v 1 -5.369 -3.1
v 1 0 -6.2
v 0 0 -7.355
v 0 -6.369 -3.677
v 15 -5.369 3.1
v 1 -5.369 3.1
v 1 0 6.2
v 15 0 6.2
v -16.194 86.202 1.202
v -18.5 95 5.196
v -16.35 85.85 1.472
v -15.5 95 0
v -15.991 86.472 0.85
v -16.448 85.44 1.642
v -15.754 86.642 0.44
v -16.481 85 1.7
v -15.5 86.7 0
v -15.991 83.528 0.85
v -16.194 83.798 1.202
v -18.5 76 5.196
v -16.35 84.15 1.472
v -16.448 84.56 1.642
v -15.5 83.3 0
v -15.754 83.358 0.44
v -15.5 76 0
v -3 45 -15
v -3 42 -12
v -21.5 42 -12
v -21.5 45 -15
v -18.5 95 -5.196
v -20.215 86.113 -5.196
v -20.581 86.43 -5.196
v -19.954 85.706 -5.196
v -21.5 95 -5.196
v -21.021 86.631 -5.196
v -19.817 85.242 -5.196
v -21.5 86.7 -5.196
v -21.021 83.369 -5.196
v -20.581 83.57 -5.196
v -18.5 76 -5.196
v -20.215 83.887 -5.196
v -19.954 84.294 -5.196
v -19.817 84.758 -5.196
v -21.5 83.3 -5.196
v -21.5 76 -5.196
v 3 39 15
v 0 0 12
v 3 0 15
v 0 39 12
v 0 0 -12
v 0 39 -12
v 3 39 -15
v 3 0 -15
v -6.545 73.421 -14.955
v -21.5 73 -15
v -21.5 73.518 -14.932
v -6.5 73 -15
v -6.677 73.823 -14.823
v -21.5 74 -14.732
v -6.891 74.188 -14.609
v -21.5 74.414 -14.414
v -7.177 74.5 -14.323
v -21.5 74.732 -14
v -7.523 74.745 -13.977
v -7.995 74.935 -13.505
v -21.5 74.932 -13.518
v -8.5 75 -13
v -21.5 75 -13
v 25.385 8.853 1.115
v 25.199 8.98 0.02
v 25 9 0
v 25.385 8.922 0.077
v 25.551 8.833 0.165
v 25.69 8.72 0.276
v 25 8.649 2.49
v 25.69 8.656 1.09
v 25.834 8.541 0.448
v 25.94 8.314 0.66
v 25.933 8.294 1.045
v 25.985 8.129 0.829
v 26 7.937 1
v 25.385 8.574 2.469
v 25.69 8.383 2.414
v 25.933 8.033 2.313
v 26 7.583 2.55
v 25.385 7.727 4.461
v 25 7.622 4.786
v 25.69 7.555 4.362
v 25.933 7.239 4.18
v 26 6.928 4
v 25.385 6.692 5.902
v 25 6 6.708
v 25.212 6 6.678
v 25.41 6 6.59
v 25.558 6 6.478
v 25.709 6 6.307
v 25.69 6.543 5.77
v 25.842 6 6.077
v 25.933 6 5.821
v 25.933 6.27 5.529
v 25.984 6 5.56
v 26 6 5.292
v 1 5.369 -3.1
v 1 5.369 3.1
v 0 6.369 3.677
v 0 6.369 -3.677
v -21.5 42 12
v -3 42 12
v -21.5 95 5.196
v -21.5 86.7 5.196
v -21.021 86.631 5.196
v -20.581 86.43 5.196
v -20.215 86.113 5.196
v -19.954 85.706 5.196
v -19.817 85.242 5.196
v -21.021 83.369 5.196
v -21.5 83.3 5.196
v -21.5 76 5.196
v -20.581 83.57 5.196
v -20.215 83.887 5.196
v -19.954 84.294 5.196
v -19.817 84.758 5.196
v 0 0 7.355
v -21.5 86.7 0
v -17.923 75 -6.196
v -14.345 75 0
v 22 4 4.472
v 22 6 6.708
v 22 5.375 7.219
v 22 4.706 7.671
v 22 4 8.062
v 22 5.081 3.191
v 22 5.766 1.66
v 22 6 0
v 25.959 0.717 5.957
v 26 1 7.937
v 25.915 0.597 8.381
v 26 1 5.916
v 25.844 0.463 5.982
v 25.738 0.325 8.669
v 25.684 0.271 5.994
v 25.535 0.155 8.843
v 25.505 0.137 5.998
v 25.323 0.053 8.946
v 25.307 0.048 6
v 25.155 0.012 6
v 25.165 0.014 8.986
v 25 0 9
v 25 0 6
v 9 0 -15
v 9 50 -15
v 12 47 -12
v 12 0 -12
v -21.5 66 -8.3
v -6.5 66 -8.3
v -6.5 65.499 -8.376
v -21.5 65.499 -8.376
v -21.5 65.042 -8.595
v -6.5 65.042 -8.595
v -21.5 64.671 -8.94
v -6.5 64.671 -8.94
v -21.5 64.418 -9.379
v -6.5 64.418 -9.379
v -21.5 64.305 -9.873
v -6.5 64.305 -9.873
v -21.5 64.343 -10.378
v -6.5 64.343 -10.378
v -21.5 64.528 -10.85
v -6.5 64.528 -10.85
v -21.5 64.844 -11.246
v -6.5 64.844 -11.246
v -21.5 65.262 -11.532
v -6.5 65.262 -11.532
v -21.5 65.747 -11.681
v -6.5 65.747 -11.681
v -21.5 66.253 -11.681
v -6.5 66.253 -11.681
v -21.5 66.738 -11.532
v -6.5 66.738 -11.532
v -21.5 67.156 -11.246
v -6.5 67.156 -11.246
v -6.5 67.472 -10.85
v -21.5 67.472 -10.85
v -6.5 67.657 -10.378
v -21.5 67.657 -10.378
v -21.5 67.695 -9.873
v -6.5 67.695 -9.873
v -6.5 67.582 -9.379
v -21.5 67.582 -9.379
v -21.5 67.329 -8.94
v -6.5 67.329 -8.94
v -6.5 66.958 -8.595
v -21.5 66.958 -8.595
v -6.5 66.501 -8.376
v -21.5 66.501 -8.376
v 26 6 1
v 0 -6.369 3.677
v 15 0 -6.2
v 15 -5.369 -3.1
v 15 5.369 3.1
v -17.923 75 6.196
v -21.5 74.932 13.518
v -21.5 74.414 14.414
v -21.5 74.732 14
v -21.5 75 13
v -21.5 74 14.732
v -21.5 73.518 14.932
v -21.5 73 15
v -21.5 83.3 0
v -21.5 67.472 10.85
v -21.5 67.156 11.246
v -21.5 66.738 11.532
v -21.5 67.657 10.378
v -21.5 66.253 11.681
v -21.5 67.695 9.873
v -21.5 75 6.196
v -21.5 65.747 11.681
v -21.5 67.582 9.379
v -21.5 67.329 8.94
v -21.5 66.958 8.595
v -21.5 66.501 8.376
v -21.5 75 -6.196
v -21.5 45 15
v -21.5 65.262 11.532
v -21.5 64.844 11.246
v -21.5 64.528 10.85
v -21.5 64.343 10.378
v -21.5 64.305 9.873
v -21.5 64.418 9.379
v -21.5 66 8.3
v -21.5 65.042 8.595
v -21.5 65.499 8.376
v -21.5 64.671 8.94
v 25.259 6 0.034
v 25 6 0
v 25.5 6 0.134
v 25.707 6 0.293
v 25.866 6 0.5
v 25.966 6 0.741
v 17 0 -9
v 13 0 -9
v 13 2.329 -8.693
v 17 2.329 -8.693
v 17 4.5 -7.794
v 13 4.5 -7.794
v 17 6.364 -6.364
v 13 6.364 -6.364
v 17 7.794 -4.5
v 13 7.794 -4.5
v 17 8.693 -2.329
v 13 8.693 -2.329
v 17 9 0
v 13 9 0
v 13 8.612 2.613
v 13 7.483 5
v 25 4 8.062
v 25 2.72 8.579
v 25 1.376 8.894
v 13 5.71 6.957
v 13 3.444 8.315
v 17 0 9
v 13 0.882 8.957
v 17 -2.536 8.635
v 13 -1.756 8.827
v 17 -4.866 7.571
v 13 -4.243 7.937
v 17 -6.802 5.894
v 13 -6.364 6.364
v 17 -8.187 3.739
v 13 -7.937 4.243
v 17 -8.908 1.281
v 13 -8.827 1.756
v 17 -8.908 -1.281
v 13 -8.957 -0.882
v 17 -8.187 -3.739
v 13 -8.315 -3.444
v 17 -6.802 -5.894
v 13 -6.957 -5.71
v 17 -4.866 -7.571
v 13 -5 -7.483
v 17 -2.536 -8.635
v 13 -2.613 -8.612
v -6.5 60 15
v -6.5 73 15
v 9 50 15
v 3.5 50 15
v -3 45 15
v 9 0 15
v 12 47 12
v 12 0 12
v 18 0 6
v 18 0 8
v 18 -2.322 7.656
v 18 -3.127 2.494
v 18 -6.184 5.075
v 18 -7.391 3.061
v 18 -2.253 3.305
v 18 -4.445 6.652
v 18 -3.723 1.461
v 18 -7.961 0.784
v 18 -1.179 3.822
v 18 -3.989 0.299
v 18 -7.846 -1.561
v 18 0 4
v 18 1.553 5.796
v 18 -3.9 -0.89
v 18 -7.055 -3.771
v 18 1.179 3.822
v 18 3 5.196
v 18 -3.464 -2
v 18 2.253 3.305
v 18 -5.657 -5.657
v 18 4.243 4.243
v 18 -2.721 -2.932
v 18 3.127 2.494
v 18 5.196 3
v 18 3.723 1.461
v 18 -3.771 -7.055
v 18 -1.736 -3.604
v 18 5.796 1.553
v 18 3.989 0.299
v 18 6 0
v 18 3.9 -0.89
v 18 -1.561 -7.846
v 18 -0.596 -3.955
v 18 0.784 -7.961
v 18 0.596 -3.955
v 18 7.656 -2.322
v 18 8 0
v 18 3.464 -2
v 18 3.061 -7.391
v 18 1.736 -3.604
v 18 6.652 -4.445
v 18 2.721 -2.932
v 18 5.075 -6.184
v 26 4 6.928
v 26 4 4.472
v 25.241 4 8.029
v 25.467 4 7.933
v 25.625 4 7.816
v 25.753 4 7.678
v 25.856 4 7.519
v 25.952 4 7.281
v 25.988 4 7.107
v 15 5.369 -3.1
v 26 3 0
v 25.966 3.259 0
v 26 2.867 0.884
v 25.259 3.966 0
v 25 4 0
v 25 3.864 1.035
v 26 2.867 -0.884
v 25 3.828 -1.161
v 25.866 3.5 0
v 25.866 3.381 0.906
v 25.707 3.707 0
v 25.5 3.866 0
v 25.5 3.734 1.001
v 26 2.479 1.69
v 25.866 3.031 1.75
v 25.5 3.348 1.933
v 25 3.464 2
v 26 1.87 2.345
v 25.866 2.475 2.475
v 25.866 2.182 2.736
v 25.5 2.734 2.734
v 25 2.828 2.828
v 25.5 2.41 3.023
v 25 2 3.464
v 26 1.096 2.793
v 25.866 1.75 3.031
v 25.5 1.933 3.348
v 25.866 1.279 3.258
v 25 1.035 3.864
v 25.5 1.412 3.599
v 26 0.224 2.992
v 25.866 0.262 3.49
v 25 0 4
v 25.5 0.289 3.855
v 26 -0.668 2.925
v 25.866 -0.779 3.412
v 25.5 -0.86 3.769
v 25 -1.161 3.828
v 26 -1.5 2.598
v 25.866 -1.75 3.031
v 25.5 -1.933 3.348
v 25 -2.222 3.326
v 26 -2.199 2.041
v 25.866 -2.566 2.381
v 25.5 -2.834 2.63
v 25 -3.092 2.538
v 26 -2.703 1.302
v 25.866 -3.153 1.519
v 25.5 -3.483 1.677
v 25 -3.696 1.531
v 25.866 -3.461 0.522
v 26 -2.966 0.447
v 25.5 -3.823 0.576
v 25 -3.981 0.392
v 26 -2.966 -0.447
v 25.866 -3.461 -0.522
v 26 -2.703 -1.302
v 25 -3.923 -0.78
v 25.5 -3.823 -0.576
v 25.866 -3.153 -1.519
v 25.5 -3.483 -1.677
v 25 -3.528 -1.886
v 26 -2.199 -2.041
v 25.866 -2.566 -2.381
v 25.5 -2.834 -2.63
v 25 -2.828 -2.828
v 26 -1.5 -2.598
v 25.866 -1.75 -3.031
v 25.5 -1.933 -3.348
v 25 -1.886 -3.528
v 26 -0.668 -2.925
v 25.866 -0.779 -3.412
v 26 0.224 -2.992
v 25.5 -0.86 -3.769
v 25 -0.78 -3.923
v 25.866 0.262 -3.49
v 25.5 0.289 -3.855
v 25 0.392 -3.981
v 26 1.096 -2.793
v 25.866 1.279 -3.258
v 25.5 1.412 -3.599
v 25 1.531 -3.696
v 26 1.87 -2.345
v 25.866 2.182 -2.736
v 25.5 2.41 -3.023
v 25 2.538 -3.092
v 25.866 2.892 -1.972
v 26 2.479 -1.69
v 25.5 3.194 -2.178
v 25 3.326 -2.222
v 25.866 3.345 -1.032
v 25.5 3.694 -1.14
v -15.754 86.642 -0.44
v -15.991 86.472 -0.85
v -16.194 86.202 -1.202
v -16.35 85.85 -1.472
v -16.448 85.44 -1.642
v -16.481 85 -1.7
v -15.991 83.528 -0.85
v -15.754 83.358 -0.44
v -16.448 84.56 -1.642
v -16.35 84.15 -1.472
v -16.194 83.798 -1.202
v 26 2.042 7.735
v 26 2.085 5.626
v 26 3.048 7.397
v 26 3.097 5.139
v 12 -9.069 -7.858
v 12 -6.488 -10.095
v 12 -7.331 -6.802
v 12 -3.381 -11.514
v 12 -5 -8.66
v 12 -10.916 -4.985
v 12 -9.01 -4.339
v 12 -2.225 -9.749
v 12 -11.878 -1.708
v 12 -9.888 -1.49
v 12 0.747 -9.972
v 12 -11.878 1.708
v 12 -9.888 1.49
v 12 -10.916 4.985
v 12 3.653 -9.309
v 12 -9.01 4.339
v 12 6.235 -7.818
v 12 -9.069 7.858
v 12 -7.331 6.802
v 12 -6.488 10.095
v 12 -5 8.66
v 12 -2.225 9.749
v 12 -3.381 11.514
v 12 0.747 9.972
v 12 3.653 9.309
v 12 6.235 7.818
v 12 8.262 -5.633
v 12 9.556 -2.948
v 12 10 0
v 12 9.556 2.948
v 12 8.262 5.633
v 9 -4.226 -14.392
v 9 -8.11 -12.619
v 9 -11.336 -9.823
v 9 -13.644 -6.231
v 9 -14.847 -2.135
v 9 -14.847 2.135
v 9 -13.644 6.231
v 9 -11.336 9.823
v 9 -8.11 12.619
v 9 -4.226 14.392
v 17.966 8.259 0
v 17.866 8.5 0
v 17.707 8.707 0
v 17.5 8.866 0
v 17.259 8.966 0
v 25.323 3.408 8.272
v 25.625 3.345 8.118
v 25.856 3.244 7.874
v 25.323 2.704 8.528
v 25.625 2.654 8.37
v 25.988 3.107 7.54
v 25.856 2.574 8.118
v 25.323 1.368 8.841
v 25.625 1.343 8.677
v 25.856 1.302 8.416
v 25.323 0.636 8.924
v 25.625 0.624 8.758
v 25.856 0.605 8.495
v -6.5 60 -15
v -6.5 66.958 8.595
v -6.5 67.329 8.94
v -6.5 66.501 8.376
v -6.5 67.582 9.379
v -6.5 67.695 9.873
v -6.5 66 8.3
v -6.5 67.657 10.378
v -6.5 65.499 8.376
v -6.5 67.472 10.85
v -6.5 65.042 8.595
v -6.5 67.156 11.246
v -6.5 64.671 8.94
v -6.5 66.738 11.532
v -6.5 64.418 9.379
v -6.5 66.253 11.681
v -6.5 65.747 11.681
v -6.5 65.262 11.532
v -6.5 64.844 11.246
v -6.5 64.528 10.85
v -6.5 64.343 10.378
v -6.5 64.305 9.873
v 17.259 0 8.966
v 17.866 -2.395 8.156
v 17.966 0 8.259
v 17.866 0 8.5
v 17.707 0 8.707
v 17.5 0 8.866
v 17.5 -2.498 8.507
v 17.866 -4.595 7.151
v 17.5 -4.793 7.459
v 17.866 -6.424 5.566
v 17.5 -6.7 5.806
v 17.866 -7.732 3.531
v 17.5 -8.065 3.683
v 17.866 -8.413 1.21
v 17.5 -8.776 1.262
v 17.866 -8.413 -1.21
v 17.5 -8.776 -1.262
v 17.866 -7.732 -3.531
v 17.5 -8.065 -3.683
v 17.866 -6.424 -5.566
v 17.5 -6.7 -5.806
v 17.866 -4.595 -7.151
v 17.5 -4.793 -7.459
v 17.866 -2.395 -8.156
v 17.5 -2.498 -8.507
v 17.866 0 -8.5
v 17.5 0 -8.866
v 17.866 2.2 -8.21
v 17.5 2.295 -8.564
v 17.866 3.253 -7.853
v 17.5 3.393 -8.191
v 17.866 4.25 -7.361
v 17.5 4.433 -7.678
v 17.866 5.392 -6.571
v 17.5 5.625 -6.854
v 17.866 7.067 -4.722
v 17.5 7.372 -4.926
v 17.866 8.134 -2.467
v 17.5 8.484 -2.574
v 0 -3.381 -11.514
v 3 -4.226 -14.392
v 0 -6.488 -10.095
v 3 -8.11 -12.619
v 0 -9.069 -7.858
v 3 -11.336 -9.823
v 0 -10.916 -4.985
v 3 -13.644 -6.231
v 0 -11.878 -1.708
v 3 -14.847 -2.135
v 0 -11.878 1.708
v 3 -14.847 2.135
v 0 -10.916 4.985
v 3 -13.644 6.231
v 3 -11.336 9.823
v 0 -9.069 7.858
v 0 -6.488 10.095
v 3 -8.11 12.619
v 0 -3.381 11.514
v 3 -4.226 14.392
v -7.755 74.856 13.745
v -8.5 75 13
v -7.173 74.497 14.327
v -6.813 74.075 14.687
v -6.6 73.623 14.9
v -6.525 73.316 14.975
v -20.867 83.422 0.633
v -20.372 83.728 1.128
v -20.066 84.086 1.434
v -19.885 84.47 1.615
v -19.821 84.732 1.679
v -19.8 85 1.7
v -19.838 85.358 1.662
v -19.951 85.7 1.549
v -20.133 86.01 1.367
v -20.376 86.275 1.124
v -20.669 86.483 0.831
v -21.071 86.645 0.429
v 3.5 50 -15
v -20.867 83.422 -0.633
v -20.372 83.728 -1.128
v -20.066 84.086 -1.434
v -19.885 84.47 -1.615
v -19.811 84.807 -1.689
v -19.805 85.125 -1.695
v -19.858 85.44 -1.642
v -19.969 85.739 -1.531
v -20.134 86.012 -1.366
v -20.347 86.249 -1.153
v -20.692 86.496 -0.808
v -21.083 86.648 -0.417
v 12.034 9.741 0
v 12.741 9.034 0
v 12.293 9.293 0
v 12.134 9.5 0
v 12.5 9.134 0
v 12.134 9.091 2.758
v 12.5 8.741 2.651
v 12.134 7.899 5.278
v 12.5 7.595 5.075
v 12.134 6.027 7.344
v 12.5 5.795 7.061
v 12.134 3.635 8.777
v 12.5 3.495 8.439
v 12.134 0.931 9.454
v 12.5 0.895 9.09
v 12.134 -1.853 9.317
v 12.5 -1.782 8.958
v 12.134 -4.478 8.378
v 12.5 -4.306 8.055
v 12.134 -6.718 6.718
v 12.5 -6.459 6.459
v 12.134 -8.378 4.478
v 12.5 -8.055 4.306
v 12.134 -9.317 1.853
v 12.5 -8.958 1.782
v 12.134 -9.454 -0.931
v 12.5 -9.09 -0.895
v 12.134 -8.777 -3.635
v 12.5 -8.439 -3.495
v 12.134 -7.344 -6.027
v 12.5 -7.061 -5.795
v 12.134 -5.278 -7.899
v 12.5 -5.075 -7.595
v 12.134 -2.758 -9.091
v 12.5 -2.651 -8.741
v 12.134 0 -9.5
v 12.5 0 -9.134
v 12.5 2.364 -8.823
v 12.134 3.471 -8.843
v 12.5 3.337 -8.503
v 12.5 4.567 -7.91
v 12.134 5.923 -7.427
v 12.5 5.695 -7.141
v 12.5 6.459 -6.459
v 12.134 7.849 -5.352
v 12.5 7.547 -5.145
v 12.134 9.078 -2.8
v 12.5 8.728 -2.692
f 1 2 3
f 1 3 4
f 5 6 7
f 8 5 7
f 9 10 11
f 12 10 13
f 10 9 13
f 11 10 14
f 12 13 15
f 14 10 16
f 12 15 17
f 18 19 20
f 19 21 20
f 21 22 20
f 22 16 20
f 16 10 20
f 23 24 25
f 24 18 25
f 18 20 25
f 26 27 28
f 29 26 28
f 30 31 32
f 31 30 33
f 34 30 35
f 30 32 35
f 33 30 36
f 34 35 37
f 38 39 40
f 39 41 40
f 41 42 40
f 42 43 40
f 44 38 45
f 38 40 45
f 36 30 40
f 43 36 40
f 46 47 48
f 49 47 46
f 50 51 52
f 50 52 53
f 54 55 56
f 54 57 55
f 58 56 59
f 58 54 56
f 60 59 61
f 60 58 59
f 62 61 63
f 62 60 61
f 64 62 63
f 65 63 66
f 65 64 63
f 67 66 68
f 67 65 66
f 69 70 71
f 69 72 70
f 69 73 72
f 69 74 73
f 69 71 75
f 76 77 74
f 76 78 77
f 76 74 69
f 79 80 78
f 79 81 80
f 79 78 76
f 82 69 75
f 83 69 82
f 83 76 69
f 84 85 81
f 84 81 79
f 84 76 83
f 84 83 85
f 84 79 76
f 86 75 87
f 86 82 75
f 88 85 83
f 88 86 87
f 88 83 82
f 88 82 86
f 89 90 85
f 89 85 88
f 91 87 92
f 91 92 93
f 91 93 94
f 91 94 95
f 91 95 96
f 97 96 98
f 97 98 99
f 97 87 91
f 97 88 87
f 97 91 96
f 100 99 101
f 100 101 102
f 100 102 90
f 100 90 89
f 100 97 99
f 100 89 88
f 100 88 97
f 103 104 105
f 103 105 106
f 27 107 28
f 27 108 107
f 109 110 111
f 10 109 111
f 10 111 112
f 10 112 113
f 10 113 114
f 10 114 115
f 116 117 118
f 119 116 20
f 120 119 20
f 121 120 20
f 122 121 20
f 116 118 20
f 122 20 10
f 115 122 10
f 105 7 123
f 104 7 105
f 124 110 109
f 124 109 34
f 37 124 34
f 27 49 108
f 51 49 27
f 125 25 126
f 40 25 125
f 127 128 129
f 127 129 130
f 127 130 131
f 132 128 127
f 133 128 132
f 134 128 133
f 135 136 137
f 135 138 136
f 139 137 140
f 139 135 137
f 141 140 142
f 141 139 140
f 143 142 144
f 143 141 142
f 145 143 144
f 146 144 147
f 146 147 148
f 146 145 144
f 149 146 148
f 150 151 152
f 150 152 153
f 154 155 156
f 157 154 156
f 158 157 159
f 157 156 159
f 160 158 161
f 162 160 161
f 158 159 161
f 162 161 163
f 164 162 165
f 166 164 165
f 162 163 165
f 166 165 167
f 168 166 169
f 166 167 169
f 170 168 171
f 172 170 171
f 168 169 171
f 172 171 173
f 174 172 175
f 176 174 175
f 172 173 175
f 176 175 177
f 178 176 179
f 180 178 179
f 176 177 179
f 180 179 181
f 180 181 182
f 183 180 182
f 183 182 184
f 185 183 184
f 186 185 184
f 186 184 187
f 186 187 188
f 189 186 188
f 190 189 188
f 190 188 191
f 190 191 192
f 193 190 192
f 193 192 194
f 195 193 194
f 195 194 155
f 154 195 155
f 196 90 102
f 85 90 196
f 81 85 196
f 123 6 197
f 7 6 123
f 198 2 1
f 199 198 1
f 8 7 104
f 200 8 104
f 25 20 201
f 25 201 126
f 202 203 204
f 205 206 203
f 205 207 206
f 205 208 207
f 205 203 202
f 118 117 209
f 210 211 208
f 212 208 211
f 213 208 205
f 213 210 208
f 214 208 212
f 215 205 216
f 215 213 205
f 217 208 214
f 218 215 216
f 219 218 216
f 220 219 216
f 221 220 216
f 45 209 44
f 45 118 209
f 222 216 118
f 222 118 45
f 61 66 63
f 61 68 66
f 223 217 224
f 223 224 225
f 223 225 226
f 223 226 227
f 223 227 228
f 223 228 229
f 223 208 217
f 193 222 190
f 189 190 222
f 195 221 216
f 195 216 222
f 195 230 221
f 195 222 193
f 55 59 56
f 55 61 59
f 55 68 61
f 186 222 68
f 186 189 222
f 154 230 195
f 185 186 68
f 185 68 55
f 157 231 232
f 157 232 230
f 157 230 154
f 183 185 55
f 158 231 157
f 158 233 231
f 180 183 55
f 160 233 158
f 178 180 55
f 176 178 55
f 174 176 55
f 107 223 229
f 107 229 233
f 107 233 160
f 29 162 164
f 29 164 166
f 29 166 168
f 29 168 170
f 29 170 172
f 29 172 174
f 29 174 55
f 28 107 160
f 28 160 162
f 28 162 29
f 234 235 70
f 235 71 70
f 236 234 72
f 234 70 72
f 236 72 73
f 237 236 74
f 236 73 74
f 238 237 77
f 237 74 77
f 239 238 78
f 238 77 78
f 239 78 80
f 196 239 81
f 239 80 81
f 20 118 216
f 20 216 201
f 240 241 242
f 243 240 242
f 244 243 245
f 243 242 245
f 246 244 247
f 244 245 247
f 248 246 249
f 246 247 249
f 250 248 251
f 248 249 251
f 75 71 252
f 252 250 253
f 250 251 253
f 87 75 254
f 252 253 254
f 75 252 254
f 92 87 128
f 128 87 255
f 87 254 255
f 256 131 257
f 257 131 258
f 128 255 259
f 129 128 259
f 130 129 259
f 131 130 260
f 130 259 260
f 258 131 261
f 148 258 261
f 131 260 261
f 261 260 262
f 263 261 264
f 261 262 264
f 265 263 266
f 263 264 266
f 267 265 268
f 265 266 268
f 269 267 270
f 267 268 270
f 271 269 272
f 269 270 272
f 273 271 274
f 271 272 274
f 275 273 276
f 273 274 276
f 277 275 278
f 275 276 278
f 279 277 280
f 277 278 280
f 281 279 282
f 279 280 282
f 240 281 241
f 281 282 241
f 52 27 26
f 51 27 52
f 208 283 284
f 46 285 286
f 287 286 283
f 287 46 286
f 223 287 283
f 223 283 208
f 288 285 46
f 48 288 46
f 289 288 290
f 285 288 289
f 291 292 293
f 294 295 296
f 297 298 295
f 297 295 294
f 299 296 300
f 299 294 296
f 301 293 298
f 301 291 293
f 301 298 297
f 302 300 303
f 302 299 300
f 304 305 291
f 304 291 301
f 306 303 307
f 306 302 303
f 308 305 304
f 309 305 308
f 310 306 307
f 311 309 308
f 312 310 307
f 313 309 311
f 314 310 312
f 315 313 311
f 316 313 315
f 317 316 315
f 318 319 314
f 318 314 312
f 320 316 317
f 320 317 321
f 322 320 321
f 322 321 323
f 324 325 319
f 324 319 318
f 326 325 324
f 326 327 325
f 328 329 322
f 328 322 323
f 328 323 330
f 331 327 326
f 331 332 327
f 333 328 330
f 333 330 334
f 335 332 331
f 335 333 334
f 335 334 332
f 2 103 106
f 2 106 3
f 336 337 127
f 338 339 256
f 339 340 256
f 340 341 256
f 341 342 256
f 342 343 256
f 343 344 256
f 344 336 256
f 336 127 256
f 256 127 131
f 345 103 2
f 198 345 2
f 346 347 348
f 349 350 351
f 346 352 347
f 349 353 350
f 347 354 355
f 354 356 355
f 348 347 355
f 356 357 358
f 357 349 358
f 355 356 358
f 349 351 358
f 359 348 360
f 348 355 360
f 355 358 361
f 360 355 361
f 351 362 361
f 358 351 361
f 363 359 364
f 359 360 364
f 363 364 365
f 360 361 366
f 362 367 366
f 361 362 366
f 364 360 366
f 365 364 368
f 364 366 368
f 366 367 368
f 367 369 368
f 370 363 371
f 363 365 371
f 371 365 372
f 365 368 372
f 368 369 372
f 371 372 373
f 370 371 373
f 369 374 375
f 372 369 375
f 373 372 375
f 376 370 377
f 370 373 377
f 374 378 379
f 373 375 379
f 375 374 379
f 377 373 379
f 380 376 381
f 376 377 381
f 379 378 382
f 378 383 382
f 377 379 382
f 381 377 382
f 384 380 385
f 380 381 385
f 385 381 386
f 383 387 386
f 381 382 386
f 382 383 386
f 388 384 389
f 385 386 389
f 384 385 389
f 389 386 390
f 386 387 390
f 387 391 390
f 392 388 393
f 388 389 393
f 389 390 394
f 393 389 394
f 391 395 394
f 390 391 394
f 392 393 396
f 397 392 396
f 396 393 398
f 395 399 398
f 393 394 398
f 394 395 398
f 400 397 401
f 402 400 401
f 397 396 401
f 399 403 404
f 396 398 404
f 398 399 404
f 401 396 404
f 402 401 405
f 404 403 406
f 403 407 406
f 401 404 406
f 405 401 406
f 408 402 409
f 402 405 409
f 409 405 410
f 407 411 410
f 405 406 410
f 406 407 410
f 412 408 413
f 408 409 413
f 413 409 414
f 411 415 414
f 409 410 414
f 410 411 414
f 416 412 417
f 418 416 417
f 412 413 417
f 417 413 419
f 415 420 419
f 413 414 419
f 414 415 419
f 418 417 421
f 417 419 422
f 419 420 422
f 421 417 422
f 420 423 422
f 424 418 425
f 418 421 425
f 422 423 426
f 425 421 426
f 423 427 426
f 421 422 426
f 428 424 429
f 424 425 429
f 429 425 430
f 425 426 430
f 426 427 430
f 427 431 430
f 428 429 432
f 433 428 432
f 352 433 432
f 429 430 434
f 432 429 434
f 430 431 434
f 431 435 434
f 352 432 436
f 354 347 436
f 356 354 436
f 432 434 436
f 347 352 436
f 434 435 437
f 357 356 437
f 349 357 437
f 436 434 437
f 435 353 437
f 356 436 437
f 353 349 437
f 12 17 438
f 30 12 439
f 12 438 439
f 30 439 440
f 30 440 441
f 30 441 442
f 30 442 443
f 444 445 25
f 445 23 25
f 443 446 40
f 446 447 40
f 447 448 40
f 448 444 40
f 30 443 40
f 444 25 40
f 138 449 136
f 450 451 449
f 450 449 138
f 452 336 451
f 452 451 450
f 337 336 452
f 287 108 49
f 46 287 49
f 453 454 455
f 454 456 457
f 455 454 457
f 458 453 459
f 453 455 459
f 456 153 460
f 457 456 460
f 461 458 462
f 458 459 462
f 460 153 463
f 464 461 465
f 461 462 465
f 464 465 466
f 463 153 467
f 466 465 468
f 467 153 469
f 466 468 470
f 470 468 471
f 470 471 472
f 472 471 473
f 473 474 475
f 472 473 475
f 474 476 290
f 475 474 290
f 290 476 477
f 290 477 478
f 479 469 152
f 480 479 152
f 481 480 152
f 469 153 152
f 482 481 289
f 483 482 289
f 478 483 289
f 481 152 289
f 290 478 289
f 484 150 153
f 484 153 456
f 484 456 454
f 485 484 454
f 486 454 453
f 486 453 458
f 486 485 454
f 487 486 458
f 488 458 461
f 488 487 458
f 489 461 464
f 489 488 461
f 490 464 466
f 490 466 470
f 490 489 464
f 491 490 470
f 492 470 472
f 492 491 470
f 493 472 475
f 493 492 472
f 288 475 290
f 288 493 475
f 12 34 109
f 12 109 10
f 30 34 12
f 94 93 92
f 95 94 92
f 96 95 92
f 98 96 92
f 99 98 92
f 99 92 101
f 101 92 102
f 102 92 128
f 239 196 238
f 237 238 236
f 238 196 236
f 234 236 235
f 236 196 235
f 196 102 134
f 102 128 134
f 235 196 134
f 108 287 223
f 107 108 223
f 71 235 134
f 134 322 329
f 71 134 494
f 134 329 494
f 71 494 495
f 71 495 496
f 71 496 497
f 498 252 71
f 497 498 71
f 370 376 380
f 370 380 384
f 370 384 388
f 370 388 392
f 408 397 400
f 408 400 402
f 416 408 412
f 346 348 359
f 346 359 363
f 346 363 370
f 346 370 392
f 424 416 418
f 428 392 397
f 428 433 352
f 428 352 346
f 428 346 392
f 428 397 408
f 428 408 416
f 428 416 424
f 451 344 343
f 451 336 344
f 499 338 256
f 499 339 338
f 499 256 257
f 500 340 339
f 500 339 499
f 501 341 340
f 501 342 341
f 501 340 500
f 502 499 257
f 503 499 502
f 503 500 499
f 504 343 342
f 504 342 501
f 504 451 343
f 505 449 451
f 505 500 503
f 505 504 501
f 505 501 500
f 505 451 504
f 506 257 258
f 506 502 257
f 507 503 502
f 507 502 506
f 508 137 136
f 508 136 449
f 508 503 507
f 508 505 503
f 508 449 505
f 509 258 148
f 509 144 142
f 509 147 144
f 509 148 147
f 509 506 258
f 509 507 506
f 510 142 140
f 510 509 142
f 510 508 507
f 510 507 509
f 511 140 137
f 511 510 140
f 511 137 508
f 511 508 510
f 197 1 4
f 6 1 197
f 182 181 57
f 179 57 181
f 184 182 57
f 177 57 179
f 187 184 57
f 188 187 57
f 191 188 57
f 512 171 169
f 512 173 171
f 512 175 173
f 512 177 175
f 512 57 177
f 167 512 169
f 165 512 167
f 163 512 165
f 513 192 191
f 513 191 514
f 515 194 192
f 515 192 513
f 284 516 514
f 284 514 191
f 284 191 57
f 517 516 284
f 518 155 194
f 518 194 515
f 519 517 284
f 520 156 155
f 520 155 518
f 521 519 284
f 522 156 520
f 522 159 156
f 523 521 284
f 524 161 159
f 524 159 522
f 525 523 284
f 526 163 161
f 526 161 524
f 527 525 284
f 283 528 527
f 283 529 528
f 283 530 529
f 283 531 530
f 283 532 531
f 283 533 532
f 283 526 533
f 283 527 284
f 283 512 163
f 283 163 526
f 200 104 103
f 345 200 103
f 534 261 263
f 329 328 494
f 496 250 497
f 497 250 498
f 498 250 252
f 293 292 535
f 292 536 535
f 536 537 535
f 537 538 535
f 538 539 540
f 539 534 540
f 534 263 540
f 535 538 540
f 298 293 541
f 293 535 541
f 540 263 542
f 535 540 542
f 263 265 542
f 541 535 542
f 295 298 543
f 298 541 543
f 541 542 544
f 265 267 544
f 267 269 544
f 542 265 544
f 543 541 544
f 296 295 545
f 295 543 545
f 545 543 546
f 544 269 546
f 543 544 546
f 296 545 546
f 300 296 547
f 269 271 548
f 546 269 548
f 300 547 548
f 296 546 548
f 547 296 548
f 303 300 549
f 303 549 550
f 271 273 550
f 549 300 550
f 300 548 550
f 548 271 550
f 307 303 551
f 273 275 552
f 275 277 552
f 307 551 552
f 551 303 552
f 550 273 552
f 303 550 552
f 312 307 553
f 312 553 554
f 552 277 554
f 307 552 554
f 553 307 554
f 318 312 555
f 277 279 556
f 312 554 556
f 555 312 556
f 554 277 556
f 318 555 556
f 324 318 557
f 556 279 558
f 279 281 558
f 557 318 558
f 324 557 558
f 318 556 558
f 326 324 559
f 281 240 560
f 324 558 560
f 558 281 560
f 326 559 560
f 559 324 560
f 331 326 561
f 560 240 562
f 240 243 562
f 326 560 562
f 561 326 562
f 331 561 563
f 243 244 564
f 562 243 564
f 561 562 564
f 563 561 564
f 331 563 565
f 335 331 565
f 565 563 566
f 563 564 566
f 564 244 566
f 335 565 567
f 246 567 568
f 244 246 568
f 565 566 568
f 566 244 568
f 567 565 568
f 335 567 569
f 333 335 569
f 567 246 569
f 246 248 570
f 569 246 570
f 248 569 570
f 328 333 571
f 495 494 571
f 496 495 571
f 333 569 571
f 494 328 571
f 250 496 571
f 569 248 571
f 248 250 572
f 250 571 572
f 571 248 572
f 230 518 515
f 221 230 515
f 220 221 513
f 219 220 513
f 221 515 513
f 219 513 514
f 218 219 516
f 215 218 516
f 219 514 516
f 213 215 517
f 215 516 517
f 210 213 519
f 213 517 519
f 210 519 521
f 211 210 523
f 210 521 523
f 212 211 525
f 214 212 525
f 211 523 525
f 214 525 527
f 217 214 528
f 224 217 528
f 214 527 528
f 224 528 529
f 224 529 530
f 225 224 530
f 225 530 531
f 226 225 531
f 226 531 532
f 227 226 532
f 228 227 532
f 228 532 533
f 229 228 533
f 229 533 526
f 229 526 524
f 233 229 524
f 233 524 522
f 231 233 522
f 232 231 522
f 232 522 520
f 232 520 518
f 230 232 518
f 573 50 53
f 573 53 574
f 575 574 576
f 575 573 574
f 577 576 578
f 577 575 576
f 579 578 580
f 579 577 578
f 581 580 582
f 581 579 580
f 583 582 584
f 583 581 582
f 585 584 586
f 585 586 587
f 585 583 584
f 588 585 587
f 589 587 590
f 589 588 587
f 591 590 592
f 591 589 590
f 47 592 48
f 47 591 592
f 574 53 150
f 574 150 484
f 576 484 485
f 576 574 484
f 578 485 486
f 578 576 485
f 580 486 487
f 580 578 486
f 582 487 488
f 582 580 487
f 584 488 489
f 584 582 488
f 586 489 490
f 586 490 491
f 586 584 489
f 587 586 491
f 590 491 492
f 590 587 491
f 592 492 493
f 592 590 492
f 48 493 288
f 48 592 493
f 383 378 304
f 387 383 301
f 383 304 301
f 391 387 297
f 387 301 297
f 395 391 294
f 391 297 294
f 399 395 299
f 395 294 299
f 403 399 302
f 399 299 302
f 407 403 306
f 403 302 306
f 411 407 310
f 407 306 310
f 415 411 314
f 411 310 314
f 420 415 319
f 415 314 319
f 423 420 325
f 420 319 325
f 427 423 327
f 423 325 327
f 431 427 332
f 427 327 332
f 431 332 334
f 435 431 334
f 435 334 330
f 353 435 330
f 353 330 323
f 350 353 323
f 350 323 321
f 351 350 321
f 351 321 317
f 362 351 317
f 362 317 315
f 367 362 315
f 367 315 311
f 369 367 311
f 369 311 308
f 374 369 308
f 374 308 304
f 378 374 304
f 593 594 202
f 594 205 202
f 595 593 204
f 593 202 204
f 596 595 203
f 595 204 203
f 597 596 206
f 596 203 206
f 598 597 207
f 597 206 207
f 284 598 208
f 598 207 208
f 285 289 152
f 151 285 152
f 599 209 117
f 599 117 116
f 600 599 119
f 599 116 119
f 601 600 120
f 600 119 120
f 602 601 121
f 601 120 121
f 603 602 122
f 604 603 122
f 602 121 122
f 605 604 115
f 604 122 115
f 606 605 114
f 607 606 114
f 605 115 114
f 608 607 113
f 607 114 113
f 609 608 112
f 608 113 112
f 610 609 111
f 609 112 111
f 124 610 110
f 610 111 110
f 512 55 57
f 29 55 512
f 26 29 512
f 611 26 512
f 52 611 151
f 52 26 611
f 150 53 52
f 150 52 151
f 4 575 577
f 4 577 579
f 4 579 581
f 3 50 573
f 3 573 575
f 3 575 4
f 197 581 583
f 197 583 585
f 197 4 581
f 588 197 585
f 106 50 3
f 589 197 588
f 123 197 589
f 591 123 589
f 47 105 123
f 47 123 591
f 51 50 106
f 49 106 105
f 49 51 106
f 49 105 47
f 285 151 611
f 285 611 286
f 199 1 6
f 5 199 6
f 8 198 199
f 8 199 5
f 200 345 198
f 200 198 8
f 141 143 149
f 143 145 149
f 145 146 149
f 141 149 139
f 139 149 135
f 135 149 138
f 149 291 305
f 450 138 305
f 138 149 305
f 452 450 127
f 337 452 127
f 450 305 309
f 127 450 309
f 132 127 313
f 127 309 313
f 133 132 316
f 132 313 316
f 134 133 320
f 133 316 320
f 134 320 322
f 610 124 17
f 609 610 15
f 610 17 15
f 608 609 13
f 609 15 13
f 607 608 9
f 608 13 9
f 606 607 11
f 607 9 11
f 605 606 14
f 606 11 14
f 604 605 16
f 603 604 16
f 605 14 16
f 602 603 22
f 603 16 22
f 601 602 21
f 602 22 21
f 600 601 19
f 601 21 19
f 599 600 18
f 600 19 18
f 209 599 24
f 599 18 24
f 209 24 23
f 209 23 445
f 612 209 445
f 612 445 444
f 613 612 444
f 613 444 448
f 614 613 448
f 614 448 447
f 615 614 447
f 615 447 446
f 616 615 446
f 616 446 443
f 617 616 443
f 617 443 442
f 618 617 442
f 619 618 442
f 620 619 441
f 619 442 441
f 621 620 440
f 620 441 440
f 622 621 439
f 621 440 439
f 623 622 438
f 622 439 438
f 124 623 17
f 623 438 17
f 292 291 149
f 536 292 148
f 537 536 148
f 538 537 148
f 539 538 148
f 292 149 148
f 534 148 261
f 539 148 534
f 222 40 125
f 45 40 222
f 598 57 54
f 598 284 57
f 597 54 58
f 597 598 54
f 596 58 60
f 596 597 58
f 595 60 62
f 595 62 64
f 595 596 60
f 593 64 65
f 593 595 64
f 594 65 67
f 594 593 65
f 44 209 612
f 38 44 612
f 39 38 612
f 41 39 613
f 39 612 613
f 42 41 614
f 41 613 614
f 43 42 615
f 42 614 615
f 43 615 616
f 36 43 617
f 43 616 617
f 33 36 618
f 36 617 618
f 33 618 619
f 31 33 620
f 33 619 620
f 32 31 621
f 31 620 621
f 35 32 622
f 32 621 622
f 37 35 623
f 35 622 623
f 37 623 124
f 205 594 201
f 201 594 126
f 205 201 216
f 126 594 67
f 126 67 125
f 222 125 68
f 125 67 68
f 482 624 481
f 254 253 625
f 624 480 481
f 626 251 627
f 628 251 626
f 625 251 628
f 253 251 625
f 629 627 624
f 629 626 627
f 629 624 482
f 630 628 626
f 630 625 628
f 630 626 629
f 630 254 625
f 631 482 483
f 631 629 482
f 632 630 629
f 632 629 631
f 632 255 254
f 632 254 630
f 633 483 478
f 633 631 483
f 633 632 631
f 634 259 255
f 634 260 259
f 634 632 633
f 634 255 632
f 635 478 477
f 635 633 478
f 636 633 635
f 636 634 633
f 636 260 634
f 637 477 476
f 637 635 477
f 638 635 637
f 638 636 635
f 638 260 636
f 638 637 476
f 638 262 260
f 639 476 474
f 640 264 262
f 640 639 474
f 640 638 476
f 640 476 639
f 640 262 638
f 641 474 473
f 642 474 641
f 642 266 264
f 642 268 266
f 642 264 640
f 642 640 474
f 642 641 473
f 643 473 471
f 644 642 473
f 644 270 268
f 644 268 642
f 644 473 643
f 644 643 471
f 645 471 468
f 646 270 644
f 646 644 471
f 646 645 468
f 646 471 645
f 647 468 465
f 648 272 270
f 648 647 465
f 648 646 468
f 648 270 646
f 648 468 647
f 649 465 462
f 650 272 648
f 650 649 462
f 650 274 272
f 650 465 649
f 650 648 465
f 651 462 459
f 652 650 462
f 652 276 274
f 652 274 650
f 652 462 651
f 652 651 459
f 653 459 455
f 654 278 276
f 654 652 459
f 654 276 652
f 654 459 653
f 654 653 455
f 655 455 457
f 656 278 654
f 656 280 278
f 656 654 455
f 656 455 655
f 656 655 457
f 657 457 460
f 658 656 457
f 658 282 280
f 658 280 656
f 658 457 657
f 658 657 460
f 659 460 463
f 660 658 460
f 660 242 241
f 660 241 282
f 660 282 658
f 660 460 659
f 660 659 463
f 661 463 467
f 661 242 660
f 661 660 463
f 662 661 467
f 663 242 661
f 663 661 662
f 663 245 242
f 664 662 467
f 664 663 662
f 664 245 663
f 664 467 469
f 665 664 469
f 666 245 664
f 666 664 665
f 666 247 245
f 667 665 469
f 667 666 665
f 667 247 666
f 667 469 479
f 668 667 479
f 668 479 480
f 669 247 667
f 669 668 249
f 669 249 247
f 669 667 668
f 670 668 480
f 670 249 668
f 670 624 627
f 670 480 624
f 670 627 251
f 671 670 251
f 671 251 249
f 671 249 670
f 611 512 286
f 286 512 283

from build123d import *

# Parameters (mm, degrees)
BOSS_EXTRUDE1_DEPTH  = 12
SKETCH2_R            = 9
BOSS_EXTRUDE2_DEPTH  = 6
SKETCH3_R            = 4
BOSS_EXTRUDE7_DEPTH  = 8
BOSS_EXTRUDE8_START  = -8
BOSS_EXTRUDE8_DEPTH  = 8
BOSS_EXTRUDE9_START  = -8
BOSS_EXTRUDE9_DEPTH  = 4
BOSS_EXTRUDE11_DEPTH = 21.5
BOSS_EXTRUDE12_DEPTH = 25
CHAMFER1_SIZE        = 10
SKETCH8_R            = 1.7000000000000015
CUT_EXTRUDE1_DEPTH   = 84.10385069297331
CHAMFER2_SIZE        = 3
FILLET1_R            = 2
FILLET2_R            = 1
BOSS_EXTRUDE13_DEPTH = 20
CUT_EXTRUDE2_DEPTH   = 101.54294892174786
SKETCH11_R           = 1.7000000000000037
CUT_EXTRUDE3_DEPTH   = 105.74850838221995
CHAMFER3_SIZE        = 1
CUT_EXTRUDE5_DEPTH   = 15
CHAMFER4_SIZE        = 1
FILLET3_R            = 1


with BuildPart() as part:
    # Sketch1 → Boss-Extrude1 (new body)
    with BuildSketch(Plane(origin=(0, 0, 0), x_dir=(0, 0, -1), z_dir=(1, 0, 0))):
        with BuildLine():
            Line((-15, 0), (-15, 50))
            Line((-15, 50), (15, 50))
            Line((15, 50), (15, 0))
            ThreePointArc((15, 0), (-2.76e-15, -15), (-15, 0))
        make_face()
    extrude(amount=BOSS_EXTRUDE1_DEPTH)

    # Sketch2 → Boss-Extrude2 (add)
    with BuildSketch(Plane(origin=(12, 0, 0), x_dir=(0, 0, -1), z_dir=(1, 0, 0))):
        Circle(SKETCH2_R)
    extrude(amount=BOSS_EXTRUDE2_DEPTH)

    # Sketch3 → Boss-Extrude7 (add)
    with BuildSketch(Plane(origin=(18.000000000000004, 0, 0), x_dir=(0, 0, -1), z_dir=(1, 0, 0))):
        Circle(SKETCH3_R)
    extrude(amount=BOSS_EXTRUDE7_DEPTH)

    # Sketch5 → Boss-Extrude8 (add)
    with BuildSketch(Plane(origin=(26.000000000000004, 0, 0), x_dir=(0, 0, -1), z_dir=(1, 0, 0)).offset(BOSS_EXTRUDE8_START)):
        with BuildLine():
            Line((-9, 0), (-6.000000000000001, 0))
            ThreePointArc((-6.000000000000001, 7.3e-16), (-5.605034153776295, 2.140932538638541), (-4.4721359549995805, 3.9999999999999996))
            Line((-4.472135954999581, 4), (-8.06225774829855, 4))
            ThreePointArc((-8.062257748298551, 4), (-8.762428879445668, 2.054224946946299), (-9, 1.1e-16))
        make_face()
        with BuildLine():
            Line((-6.708203932499368, 6), (0, 6))
            Line((0, 6), (0, 9))
            ThreePointArc((0, 9), (-3.6742346141747673, 8.215838362577493), (-6.7082039324993685, 6.000000000000003))
        make_face()
    extrude(amount=BOSS_EXTRUDE8_DEPTH)

    # Sketch5<3> → Boss-Extrude9 (add)
    with BuildSketch(Plane(origin=(26.000000000000004, 0, 0), x_dir=(0, 0, -1), z_dir=(1, 0, 0)).offset(BOSS_EXTRUDE9_START)):
        with BuildLine():
            Line((-8.06225774829855, 4), (-4.472135954999581, 4))
            ThreePointArc((-4.4721359549995805, 3.9999999999999996), (-2.4494897427831788, 5.477225575051661), (3.7e-16, 6.000000000000001))
            Line((0, 6), (-6.708203932499368, 6))
            ThreePointArc((-6.7082039324993685, 6.000000000000003), (-7.452626018121394, 5.045628348780764), (-8.062257748298551, 4))
        make_face()
    extrude(amount=BOSS_EXTRUDE9_DEPTH)

    # Sketch6 → Boss-Extrude11 (add)
    with BuildSketch(Plane.ZY):
        Polygon((-15, 50), (15, 50), (15, 42), (-14.999999999999998, 42), align=None)
    extrude(amount=BOSS_EXTRUDE11_DEPTH)

    # Sketch7 → Boss-Extrude12 (add)
    with BuildSketch(Plane(origin=(0, 50, 0), x_dir=(1, 0, 0), z_dir=(0, 1, 0))):
        Polygon((-21.5, 15), (-6.499999999999999, 15), (-6.499999999999996, -15), (-21.5, -15), align=None)
    extrude(amount=BOSS_EXTRUDE12_DEPTH)

    # Chamfer1
    chamfer1_edges = [part.edges().sort_by_distance(p)[0] for p in [
        (-6.499999999999997, 50, 0),
    ]]
    chamfer(chamfer1_edges, length=CHAMFER1_SIZE)

    # Sketch8 → Cut-Extrude1 (cut, through all)
    with BuildSketch(Plane(origin=(-6.499999999999997, 0, 7.5e-16), x_dir=(-1.2e-16, 0, -1), z_dir=(1, 0, -1.2e-16))):
        with Locations((-9.999999999999998, 66.00000000000007)):
            Circle(SKETCH8_R)
        with Locations((9.999999999999998, 66.00000000000007)):
            Circle(SKETCH8_R)
    extrude(amount=-CUT_EXTRUDE1_DEPTH, mode=Mode.SUBTRACT)

    # Chamfer2
    chamfer2_edges = [part.edges().sort_by_distance(p)[0] for p in [
        (0, -14.999999999999998, -2.03e-15),
        (-10.75, 42, -14.999999999999998),
        (0, 21, -15),
        (0, 21, 15),
        (0, 42, 0),
        (-10.75, 42, 15),
        (12, -14.999999999999998, -2.03e-15),
        (12, 25, -15),
        (12, 25, 15),
        (12, 50, 0),
    ]]
    chamfer(chamfer2_edges, length=CHAMFER2_SIZE)

    # Fillet1
    fillet1_edges = [part.edges().sort_by_distance(p)[0] for p in [
        (-14, 75, -15),
        (-6.499999999999997, 75, 0),
        (-13.999999999999996, 75, 15),
    ]]
    fillet(fillet1_edges, radius=FILLET1_R)

    # Fillet2
    fillet2_edges = [part.edges().sort_by_distance(p)[0] for p in [
        (26.000000000000004, 3.8e-16, 4),
        (18, -9, 1.65e-15),
        (12, 1.1e-15, 9),
    ]]
    fillet(fillet2_edges, radius=FILLET2_R)

    # Sketch9 → Boss-Extrude13 (add)
    with BuildSketch(Plane(origin=(0, 75.00000000000001, 0), x_dir=(1, 0, 0), z_dir=(0, 1, 0))):
        Polygon((-15.500000000000007, -1.041e-14), (-18.500000000000004, 5.1961524227066205), (-21.5, 5.1961524227066205), (-21.5, -5.196152422706621), (-18.5, -5.196152422706619), align=None)
    extrude(amount=BOSS_EXTRUDE13_DEPTH)

    # Sketch10 → Cut-Extrude2 (cut, through all)
    with BuildSketch(Plane.XY.offset(5.196152422706602)):
        with BuildLine():
            Line((-21.5, 86.70000000000002), (-21.5, 83.30000000000003))
            ThreePointArc((-21.5, 83.30000000000003), (-19.80000000000001, 85.00000000000001), (-21.5, 86.70000000000002))
        make_face()
    extrude(amount=-CUT_EXTRUDE2_DEPTH, mode=Mode.SUBTRACT)

    # Sketch11 → Cut-Extrude3 (cut, through all)
    with BuildSketch(Plane(origin=(-15.500000000000007, 0, 1.79e-15), x_dir=(-1.2e-16, 0, -1), z_dir=(1, 0, -1.2e-16))):
        with Locations((-8.62e-15, 85.00000000000001)):
            Circle(SKETCH11_R)
    extrude(amount=-CUT_EXTRUDE3_DEPTH, mode=Mode.SUBTRACT)

    # Chamfer3
    chamfer3_edges = [part.edges().sort_by_distance(p)[0] for p in [
        (-20, 75.00000000000001, -5.1961524227066205),
        (-17.000000000000007, 75.00000000000001, -2.5980762113533054),
        (-20, 75.00000000000001, 5.19615242270662),
        (-17.000000000000004, 75.00000000000001, 2.5980762113533147),
    ]]
    chamfer(chamfer3_edges, length=CHAMFER3_SIZE)

    # Sketch12 → Cut-Extrude5 (cut)
    with BuildSketch(Plane.ZY):
        Polygon((6.200000000000001, 8.7e-16), (3.100000000000001, 5.369357503463521), (-3.100000000000001, 5.369357503463522), (-6.200000000000002, 1.74e-15), (-3.100000000000001, -5.3693575034635215), (3.0999999999999996, -5.369357503463523), align=None)
    extrude(amount=-CUT_EXTRUDE5_DEPTH, mode=Mode.SUBTRACT)

    # Chamfer4
    chamfer4_edges = [part.edges().sort_by_distance(p)[0] for p in [
        (0, -5.369357503463522, -4.4e-16),
        (0, -2.68467875173176, -4.650000000000001),
        (0, -2.684678751731761, 4.65),
        (0, 2.6846787517317607, 4.650000000000001),
        (0, 2.684678751731762, -4.650000000000002),
        (0, 5.3693575034635215, 0),
    ]]
    chamfer(chamfer4_edges, length=CHAMFER4_SIZE)

    # Fillet3
    fillet3_edges = [part.edges().sort_by_distance(p)[0] for p in [
        (26.000000000000004, 0, 7.5),
        (26.000000000000004, 7.5, 0),
        (26.000000000000004, 2.054224946946299, 8.762428879445668),
        (26.000000000000004, 8.215838362577493, 3.674234614174768),
    ]]
    fillet(fillet3_edges, radius=FILLET3_R)


solid = part.part
